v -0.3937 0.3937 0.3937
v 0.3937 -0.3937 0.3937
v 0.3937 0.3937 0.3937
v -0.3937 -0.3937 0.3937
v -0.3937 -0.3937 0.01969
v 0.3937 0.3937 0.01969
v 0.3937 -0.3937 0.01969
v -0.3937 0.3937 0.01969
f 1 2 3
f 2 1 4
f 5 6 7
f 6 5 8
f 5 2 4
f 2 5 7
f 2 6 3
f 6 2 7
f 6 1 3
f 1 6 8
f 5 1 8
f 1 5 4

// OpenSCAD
// file: defines.scad
L = 2.0;  // Длина
W = 2.0;  // Ширина
H = 1.0;  // Высота
Hf = 0.05;  // Возвышение над платой (высота выводов)
e = 0.4;    // Шаг выводов

pin_fragments = 16;

scale = 1/2.54;
// main file
include <defines.scad>

scale(scale)
  color([0.15,0.15,0.15])
    translate([-L/2,-W/2,Hf])
      cube([L,W,H - Hf]);
